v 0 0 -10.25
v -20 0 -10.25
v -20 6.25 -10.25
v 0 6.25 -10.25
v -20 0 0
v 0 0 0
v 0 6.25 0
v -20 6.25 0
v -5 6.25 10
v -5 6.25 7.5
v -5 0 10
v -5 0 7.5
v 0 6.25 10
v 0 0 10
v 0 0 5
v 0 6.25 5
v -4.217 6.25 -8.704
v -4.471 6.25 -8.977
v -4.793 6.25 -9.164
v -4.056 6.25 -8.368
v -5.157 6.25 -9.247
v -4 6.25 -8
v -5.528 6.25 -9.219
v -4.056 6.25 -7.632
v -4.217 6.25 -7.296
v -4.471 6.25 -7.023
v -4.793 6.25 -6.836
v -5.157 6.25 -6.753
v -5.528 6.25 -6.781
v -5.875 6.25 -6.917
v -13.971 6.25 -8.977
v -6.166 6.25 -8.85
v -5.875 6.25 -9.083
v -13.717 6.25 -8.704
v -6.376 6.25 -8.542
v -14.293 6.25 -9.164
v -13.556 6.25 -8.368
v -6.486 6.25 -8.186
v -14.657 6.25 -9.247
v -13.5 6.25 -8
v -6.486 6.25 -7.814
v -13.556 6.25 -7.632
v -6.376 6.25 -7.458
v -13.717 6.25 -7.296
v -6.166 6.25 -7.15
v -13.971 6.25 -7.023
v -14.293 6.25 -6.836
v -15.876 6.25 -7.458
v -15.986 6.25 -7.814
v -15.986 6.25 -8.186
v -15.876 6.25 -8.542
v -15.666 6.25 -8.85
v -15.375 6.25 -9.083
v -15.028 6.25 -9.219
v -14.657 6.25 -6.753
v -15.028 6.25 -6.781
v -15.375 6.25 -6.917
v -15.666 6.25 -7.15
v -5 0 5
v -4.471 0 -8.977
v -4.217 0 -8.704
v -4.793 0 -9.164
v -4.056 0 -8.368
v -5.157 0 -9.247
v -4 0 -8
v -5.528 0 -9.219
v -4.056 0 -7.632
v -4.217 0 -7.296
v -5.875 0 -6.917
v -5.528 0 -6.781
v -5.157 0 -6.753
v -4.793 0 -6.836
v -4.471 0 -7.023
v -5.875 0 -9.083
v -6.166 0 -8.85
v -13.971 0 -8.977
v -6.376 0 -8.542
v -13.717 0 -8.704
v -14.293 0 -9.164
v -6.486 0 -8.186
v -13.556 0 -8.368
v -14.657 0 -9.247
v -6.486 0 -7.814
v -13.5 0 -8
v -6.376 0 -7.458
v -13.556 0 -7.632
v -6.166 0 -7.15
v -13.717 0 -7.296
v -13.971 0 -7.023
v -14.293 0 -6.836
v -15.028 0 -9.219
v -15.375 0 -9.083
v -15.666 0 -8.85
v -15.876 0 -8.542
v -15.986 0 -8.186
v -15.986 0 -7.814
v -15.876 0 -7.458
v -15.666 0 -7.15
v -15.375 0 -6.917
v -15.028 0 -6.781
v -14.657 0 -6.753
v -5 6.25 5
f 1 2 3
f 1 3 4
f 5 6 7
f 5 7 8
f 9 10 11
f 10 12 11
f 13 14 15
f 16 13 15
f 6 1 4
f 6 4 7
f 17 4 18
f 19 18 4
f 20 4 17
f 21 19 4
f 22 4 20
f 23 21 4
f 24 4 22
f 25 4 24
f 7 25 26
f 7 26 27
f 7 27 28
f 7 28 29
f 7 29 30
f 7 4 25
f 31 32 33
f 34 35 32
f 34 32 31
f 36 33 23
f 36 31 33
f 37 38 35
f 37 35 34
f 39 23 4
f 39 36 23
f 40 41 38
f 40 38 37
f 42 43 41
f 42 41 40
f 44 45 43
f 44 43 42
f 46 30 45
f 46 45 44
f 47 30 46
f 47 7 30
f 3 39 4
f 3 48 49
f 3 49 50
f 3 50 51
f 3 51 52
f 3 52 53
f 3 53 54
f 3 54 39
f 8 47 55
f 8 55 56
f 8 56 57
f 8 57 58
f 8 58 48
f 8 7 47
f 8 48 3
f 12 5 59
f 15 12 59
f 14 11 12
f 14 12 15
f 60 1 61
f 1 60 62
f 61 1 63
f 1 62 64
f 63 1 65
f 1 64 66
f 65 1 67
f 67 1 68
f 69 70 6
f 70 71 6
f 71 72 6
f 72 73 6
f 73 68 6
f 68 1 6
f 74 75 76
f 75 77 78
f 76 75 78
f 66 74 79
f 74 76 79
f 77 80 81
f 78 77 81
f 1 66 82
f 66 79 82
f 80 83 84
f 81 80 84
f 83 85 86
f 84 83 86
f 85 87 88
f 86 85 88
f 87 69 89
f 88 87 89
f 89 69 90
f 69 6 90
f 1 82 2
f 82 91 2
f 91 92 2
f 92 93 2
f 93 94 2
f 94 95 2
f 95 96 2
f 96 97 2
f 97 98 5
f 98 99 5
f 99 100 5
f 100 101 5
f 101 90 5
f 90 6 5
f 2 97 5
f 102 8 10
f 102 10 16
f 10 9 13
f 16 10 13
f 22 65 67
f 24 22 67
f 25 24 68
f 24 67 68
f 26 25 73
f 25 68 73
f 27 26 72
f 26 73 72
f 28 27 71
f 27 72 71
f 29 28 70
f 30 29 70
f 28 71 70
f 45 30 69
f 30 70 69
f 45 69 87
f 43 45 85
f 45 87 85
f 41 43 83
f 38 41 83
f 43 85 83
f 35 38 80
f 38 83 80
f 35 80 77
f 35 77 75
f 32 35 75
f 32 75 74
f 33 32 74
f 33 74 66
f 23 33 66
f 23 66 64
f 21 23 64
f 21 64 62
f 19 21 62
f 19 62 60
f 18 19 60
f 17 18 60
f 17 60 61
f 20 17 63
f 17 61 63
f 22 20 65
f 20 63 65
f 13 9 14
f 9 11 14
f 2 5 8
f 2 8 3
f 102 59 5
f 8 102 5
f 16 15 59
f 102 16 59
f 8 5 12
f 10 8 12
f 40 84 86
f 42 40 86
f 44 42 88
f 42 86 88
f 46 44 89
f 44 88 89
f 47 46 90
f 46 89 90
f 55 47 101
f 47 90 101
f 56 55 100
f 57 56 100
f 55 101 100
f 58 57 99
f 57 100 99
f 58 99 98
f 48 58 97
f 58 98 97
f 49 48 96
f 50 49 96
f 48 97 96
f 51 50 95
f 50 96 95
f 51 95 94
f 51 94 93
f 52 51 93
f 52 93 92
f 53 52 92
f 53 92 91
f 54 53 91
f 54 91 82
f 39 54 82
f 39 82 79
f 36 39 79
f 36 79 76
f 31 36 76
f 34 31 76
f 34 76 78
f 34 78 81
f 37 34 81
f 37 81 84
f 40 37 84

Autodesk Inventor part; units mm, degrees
ref_plane "YZ Plane" through (0, 0, 0) normal (1, 0, 0) x (0, 1, 0)
ref_plane "XZ Plane" through (0, 0, 0) normal (0, 1, 0) x (-1, 0, 0)
ref_plane "XY Plane" through (0, 0, 0) normal (0, 0, 1) x (1, 0, 0)
sketch "Sketch1" plane through (0, 0, 0) normal (0, 1, 0) x (-1, 0, 0)
  line L0 (0, 0) -> (20, 0)
  line L1 (20, 0) -> (20, -10.25)
  line L2 (20, -10.25) -> (0, -10.25)
  line L3 (0, -10.25) -> (0, 0)
  dimension "d0" = 20
  dimension "d1" = 10.25
extrude "Extrusion1" add sketch "Sketch1" along normal blind 6.25
sketch "Sketch2" plane through (0, 0, 0) normal (0, -1, 0) x (1, 0, 0)
  line L0 (-20, 0) -> (0, 0) projected
  line L1 (0, 0) -> (0, 5)
  line L2 (0, 5) -> (-5, 5)
  line L3 (-5, 5) -> (-5, 10)
  line L4 (-5, 10) -> (0, 10)
  line L5 (0, 10) -> (0, 5)
  line L6 (-20, -10.25) -> (-20, 0) projected
  line L7 (-5, 5) -> (-20, 0)
  line L8 (-20, 0) -> (-5, 7.5)
  dimension "d4" = 5
  dimension "d5" = 5
  dimension "d6" = 5
extrude "Extrusion2" add sketch "Sketch2" against normal blind 6.25 contours L8 L3 L7 | L3 L4 L5 L2
sketch "Sketch3" plane through (0, 0, 0) normal (0, -1, 0) x (1, 0, 0)
  line L0 (0, -10.25) -> (-20, -10.25) projected
  line L1 (0, -10.25) -> (-5.25, -10.25)
  line L2 (-5.25, -10.25) -> (-5.25, -8)
  line L3 (-5.25, -8) -> (0, -8)
  line L4 (0, -8) -> (0, -10.25)
  line L5 (-20, -10.25) -> (-14.75, -10.25)
  line L6 (-14.75, -10.25) -> (-14.75, -8)
  line L7 (-14.75, -8) -> (-20, -8)
  line L8 (-20, -8) -> (-20, -10.25)
  circle A0 centre (-14.75, -8) radius 1.25
  circle A1 centre (-5.25, -8) radius 1.25
  point P0 (0, 0)
  dimension "d9" = 5.25
  dimension "d10" = 2.25
  dimension "d11" = 5.25
  dimension "d12" = 2.25
  dimension "d13" = 2.5
  dimension "d14" = 2.5
extrude "Extrusion3" cut sketch "Sketch3" against normal blind 6.25 contours A1 L3 L2 | L2 L3 A1 | A0 L7 L6 | L6 L7 A0
properties part number "limit_switch"
